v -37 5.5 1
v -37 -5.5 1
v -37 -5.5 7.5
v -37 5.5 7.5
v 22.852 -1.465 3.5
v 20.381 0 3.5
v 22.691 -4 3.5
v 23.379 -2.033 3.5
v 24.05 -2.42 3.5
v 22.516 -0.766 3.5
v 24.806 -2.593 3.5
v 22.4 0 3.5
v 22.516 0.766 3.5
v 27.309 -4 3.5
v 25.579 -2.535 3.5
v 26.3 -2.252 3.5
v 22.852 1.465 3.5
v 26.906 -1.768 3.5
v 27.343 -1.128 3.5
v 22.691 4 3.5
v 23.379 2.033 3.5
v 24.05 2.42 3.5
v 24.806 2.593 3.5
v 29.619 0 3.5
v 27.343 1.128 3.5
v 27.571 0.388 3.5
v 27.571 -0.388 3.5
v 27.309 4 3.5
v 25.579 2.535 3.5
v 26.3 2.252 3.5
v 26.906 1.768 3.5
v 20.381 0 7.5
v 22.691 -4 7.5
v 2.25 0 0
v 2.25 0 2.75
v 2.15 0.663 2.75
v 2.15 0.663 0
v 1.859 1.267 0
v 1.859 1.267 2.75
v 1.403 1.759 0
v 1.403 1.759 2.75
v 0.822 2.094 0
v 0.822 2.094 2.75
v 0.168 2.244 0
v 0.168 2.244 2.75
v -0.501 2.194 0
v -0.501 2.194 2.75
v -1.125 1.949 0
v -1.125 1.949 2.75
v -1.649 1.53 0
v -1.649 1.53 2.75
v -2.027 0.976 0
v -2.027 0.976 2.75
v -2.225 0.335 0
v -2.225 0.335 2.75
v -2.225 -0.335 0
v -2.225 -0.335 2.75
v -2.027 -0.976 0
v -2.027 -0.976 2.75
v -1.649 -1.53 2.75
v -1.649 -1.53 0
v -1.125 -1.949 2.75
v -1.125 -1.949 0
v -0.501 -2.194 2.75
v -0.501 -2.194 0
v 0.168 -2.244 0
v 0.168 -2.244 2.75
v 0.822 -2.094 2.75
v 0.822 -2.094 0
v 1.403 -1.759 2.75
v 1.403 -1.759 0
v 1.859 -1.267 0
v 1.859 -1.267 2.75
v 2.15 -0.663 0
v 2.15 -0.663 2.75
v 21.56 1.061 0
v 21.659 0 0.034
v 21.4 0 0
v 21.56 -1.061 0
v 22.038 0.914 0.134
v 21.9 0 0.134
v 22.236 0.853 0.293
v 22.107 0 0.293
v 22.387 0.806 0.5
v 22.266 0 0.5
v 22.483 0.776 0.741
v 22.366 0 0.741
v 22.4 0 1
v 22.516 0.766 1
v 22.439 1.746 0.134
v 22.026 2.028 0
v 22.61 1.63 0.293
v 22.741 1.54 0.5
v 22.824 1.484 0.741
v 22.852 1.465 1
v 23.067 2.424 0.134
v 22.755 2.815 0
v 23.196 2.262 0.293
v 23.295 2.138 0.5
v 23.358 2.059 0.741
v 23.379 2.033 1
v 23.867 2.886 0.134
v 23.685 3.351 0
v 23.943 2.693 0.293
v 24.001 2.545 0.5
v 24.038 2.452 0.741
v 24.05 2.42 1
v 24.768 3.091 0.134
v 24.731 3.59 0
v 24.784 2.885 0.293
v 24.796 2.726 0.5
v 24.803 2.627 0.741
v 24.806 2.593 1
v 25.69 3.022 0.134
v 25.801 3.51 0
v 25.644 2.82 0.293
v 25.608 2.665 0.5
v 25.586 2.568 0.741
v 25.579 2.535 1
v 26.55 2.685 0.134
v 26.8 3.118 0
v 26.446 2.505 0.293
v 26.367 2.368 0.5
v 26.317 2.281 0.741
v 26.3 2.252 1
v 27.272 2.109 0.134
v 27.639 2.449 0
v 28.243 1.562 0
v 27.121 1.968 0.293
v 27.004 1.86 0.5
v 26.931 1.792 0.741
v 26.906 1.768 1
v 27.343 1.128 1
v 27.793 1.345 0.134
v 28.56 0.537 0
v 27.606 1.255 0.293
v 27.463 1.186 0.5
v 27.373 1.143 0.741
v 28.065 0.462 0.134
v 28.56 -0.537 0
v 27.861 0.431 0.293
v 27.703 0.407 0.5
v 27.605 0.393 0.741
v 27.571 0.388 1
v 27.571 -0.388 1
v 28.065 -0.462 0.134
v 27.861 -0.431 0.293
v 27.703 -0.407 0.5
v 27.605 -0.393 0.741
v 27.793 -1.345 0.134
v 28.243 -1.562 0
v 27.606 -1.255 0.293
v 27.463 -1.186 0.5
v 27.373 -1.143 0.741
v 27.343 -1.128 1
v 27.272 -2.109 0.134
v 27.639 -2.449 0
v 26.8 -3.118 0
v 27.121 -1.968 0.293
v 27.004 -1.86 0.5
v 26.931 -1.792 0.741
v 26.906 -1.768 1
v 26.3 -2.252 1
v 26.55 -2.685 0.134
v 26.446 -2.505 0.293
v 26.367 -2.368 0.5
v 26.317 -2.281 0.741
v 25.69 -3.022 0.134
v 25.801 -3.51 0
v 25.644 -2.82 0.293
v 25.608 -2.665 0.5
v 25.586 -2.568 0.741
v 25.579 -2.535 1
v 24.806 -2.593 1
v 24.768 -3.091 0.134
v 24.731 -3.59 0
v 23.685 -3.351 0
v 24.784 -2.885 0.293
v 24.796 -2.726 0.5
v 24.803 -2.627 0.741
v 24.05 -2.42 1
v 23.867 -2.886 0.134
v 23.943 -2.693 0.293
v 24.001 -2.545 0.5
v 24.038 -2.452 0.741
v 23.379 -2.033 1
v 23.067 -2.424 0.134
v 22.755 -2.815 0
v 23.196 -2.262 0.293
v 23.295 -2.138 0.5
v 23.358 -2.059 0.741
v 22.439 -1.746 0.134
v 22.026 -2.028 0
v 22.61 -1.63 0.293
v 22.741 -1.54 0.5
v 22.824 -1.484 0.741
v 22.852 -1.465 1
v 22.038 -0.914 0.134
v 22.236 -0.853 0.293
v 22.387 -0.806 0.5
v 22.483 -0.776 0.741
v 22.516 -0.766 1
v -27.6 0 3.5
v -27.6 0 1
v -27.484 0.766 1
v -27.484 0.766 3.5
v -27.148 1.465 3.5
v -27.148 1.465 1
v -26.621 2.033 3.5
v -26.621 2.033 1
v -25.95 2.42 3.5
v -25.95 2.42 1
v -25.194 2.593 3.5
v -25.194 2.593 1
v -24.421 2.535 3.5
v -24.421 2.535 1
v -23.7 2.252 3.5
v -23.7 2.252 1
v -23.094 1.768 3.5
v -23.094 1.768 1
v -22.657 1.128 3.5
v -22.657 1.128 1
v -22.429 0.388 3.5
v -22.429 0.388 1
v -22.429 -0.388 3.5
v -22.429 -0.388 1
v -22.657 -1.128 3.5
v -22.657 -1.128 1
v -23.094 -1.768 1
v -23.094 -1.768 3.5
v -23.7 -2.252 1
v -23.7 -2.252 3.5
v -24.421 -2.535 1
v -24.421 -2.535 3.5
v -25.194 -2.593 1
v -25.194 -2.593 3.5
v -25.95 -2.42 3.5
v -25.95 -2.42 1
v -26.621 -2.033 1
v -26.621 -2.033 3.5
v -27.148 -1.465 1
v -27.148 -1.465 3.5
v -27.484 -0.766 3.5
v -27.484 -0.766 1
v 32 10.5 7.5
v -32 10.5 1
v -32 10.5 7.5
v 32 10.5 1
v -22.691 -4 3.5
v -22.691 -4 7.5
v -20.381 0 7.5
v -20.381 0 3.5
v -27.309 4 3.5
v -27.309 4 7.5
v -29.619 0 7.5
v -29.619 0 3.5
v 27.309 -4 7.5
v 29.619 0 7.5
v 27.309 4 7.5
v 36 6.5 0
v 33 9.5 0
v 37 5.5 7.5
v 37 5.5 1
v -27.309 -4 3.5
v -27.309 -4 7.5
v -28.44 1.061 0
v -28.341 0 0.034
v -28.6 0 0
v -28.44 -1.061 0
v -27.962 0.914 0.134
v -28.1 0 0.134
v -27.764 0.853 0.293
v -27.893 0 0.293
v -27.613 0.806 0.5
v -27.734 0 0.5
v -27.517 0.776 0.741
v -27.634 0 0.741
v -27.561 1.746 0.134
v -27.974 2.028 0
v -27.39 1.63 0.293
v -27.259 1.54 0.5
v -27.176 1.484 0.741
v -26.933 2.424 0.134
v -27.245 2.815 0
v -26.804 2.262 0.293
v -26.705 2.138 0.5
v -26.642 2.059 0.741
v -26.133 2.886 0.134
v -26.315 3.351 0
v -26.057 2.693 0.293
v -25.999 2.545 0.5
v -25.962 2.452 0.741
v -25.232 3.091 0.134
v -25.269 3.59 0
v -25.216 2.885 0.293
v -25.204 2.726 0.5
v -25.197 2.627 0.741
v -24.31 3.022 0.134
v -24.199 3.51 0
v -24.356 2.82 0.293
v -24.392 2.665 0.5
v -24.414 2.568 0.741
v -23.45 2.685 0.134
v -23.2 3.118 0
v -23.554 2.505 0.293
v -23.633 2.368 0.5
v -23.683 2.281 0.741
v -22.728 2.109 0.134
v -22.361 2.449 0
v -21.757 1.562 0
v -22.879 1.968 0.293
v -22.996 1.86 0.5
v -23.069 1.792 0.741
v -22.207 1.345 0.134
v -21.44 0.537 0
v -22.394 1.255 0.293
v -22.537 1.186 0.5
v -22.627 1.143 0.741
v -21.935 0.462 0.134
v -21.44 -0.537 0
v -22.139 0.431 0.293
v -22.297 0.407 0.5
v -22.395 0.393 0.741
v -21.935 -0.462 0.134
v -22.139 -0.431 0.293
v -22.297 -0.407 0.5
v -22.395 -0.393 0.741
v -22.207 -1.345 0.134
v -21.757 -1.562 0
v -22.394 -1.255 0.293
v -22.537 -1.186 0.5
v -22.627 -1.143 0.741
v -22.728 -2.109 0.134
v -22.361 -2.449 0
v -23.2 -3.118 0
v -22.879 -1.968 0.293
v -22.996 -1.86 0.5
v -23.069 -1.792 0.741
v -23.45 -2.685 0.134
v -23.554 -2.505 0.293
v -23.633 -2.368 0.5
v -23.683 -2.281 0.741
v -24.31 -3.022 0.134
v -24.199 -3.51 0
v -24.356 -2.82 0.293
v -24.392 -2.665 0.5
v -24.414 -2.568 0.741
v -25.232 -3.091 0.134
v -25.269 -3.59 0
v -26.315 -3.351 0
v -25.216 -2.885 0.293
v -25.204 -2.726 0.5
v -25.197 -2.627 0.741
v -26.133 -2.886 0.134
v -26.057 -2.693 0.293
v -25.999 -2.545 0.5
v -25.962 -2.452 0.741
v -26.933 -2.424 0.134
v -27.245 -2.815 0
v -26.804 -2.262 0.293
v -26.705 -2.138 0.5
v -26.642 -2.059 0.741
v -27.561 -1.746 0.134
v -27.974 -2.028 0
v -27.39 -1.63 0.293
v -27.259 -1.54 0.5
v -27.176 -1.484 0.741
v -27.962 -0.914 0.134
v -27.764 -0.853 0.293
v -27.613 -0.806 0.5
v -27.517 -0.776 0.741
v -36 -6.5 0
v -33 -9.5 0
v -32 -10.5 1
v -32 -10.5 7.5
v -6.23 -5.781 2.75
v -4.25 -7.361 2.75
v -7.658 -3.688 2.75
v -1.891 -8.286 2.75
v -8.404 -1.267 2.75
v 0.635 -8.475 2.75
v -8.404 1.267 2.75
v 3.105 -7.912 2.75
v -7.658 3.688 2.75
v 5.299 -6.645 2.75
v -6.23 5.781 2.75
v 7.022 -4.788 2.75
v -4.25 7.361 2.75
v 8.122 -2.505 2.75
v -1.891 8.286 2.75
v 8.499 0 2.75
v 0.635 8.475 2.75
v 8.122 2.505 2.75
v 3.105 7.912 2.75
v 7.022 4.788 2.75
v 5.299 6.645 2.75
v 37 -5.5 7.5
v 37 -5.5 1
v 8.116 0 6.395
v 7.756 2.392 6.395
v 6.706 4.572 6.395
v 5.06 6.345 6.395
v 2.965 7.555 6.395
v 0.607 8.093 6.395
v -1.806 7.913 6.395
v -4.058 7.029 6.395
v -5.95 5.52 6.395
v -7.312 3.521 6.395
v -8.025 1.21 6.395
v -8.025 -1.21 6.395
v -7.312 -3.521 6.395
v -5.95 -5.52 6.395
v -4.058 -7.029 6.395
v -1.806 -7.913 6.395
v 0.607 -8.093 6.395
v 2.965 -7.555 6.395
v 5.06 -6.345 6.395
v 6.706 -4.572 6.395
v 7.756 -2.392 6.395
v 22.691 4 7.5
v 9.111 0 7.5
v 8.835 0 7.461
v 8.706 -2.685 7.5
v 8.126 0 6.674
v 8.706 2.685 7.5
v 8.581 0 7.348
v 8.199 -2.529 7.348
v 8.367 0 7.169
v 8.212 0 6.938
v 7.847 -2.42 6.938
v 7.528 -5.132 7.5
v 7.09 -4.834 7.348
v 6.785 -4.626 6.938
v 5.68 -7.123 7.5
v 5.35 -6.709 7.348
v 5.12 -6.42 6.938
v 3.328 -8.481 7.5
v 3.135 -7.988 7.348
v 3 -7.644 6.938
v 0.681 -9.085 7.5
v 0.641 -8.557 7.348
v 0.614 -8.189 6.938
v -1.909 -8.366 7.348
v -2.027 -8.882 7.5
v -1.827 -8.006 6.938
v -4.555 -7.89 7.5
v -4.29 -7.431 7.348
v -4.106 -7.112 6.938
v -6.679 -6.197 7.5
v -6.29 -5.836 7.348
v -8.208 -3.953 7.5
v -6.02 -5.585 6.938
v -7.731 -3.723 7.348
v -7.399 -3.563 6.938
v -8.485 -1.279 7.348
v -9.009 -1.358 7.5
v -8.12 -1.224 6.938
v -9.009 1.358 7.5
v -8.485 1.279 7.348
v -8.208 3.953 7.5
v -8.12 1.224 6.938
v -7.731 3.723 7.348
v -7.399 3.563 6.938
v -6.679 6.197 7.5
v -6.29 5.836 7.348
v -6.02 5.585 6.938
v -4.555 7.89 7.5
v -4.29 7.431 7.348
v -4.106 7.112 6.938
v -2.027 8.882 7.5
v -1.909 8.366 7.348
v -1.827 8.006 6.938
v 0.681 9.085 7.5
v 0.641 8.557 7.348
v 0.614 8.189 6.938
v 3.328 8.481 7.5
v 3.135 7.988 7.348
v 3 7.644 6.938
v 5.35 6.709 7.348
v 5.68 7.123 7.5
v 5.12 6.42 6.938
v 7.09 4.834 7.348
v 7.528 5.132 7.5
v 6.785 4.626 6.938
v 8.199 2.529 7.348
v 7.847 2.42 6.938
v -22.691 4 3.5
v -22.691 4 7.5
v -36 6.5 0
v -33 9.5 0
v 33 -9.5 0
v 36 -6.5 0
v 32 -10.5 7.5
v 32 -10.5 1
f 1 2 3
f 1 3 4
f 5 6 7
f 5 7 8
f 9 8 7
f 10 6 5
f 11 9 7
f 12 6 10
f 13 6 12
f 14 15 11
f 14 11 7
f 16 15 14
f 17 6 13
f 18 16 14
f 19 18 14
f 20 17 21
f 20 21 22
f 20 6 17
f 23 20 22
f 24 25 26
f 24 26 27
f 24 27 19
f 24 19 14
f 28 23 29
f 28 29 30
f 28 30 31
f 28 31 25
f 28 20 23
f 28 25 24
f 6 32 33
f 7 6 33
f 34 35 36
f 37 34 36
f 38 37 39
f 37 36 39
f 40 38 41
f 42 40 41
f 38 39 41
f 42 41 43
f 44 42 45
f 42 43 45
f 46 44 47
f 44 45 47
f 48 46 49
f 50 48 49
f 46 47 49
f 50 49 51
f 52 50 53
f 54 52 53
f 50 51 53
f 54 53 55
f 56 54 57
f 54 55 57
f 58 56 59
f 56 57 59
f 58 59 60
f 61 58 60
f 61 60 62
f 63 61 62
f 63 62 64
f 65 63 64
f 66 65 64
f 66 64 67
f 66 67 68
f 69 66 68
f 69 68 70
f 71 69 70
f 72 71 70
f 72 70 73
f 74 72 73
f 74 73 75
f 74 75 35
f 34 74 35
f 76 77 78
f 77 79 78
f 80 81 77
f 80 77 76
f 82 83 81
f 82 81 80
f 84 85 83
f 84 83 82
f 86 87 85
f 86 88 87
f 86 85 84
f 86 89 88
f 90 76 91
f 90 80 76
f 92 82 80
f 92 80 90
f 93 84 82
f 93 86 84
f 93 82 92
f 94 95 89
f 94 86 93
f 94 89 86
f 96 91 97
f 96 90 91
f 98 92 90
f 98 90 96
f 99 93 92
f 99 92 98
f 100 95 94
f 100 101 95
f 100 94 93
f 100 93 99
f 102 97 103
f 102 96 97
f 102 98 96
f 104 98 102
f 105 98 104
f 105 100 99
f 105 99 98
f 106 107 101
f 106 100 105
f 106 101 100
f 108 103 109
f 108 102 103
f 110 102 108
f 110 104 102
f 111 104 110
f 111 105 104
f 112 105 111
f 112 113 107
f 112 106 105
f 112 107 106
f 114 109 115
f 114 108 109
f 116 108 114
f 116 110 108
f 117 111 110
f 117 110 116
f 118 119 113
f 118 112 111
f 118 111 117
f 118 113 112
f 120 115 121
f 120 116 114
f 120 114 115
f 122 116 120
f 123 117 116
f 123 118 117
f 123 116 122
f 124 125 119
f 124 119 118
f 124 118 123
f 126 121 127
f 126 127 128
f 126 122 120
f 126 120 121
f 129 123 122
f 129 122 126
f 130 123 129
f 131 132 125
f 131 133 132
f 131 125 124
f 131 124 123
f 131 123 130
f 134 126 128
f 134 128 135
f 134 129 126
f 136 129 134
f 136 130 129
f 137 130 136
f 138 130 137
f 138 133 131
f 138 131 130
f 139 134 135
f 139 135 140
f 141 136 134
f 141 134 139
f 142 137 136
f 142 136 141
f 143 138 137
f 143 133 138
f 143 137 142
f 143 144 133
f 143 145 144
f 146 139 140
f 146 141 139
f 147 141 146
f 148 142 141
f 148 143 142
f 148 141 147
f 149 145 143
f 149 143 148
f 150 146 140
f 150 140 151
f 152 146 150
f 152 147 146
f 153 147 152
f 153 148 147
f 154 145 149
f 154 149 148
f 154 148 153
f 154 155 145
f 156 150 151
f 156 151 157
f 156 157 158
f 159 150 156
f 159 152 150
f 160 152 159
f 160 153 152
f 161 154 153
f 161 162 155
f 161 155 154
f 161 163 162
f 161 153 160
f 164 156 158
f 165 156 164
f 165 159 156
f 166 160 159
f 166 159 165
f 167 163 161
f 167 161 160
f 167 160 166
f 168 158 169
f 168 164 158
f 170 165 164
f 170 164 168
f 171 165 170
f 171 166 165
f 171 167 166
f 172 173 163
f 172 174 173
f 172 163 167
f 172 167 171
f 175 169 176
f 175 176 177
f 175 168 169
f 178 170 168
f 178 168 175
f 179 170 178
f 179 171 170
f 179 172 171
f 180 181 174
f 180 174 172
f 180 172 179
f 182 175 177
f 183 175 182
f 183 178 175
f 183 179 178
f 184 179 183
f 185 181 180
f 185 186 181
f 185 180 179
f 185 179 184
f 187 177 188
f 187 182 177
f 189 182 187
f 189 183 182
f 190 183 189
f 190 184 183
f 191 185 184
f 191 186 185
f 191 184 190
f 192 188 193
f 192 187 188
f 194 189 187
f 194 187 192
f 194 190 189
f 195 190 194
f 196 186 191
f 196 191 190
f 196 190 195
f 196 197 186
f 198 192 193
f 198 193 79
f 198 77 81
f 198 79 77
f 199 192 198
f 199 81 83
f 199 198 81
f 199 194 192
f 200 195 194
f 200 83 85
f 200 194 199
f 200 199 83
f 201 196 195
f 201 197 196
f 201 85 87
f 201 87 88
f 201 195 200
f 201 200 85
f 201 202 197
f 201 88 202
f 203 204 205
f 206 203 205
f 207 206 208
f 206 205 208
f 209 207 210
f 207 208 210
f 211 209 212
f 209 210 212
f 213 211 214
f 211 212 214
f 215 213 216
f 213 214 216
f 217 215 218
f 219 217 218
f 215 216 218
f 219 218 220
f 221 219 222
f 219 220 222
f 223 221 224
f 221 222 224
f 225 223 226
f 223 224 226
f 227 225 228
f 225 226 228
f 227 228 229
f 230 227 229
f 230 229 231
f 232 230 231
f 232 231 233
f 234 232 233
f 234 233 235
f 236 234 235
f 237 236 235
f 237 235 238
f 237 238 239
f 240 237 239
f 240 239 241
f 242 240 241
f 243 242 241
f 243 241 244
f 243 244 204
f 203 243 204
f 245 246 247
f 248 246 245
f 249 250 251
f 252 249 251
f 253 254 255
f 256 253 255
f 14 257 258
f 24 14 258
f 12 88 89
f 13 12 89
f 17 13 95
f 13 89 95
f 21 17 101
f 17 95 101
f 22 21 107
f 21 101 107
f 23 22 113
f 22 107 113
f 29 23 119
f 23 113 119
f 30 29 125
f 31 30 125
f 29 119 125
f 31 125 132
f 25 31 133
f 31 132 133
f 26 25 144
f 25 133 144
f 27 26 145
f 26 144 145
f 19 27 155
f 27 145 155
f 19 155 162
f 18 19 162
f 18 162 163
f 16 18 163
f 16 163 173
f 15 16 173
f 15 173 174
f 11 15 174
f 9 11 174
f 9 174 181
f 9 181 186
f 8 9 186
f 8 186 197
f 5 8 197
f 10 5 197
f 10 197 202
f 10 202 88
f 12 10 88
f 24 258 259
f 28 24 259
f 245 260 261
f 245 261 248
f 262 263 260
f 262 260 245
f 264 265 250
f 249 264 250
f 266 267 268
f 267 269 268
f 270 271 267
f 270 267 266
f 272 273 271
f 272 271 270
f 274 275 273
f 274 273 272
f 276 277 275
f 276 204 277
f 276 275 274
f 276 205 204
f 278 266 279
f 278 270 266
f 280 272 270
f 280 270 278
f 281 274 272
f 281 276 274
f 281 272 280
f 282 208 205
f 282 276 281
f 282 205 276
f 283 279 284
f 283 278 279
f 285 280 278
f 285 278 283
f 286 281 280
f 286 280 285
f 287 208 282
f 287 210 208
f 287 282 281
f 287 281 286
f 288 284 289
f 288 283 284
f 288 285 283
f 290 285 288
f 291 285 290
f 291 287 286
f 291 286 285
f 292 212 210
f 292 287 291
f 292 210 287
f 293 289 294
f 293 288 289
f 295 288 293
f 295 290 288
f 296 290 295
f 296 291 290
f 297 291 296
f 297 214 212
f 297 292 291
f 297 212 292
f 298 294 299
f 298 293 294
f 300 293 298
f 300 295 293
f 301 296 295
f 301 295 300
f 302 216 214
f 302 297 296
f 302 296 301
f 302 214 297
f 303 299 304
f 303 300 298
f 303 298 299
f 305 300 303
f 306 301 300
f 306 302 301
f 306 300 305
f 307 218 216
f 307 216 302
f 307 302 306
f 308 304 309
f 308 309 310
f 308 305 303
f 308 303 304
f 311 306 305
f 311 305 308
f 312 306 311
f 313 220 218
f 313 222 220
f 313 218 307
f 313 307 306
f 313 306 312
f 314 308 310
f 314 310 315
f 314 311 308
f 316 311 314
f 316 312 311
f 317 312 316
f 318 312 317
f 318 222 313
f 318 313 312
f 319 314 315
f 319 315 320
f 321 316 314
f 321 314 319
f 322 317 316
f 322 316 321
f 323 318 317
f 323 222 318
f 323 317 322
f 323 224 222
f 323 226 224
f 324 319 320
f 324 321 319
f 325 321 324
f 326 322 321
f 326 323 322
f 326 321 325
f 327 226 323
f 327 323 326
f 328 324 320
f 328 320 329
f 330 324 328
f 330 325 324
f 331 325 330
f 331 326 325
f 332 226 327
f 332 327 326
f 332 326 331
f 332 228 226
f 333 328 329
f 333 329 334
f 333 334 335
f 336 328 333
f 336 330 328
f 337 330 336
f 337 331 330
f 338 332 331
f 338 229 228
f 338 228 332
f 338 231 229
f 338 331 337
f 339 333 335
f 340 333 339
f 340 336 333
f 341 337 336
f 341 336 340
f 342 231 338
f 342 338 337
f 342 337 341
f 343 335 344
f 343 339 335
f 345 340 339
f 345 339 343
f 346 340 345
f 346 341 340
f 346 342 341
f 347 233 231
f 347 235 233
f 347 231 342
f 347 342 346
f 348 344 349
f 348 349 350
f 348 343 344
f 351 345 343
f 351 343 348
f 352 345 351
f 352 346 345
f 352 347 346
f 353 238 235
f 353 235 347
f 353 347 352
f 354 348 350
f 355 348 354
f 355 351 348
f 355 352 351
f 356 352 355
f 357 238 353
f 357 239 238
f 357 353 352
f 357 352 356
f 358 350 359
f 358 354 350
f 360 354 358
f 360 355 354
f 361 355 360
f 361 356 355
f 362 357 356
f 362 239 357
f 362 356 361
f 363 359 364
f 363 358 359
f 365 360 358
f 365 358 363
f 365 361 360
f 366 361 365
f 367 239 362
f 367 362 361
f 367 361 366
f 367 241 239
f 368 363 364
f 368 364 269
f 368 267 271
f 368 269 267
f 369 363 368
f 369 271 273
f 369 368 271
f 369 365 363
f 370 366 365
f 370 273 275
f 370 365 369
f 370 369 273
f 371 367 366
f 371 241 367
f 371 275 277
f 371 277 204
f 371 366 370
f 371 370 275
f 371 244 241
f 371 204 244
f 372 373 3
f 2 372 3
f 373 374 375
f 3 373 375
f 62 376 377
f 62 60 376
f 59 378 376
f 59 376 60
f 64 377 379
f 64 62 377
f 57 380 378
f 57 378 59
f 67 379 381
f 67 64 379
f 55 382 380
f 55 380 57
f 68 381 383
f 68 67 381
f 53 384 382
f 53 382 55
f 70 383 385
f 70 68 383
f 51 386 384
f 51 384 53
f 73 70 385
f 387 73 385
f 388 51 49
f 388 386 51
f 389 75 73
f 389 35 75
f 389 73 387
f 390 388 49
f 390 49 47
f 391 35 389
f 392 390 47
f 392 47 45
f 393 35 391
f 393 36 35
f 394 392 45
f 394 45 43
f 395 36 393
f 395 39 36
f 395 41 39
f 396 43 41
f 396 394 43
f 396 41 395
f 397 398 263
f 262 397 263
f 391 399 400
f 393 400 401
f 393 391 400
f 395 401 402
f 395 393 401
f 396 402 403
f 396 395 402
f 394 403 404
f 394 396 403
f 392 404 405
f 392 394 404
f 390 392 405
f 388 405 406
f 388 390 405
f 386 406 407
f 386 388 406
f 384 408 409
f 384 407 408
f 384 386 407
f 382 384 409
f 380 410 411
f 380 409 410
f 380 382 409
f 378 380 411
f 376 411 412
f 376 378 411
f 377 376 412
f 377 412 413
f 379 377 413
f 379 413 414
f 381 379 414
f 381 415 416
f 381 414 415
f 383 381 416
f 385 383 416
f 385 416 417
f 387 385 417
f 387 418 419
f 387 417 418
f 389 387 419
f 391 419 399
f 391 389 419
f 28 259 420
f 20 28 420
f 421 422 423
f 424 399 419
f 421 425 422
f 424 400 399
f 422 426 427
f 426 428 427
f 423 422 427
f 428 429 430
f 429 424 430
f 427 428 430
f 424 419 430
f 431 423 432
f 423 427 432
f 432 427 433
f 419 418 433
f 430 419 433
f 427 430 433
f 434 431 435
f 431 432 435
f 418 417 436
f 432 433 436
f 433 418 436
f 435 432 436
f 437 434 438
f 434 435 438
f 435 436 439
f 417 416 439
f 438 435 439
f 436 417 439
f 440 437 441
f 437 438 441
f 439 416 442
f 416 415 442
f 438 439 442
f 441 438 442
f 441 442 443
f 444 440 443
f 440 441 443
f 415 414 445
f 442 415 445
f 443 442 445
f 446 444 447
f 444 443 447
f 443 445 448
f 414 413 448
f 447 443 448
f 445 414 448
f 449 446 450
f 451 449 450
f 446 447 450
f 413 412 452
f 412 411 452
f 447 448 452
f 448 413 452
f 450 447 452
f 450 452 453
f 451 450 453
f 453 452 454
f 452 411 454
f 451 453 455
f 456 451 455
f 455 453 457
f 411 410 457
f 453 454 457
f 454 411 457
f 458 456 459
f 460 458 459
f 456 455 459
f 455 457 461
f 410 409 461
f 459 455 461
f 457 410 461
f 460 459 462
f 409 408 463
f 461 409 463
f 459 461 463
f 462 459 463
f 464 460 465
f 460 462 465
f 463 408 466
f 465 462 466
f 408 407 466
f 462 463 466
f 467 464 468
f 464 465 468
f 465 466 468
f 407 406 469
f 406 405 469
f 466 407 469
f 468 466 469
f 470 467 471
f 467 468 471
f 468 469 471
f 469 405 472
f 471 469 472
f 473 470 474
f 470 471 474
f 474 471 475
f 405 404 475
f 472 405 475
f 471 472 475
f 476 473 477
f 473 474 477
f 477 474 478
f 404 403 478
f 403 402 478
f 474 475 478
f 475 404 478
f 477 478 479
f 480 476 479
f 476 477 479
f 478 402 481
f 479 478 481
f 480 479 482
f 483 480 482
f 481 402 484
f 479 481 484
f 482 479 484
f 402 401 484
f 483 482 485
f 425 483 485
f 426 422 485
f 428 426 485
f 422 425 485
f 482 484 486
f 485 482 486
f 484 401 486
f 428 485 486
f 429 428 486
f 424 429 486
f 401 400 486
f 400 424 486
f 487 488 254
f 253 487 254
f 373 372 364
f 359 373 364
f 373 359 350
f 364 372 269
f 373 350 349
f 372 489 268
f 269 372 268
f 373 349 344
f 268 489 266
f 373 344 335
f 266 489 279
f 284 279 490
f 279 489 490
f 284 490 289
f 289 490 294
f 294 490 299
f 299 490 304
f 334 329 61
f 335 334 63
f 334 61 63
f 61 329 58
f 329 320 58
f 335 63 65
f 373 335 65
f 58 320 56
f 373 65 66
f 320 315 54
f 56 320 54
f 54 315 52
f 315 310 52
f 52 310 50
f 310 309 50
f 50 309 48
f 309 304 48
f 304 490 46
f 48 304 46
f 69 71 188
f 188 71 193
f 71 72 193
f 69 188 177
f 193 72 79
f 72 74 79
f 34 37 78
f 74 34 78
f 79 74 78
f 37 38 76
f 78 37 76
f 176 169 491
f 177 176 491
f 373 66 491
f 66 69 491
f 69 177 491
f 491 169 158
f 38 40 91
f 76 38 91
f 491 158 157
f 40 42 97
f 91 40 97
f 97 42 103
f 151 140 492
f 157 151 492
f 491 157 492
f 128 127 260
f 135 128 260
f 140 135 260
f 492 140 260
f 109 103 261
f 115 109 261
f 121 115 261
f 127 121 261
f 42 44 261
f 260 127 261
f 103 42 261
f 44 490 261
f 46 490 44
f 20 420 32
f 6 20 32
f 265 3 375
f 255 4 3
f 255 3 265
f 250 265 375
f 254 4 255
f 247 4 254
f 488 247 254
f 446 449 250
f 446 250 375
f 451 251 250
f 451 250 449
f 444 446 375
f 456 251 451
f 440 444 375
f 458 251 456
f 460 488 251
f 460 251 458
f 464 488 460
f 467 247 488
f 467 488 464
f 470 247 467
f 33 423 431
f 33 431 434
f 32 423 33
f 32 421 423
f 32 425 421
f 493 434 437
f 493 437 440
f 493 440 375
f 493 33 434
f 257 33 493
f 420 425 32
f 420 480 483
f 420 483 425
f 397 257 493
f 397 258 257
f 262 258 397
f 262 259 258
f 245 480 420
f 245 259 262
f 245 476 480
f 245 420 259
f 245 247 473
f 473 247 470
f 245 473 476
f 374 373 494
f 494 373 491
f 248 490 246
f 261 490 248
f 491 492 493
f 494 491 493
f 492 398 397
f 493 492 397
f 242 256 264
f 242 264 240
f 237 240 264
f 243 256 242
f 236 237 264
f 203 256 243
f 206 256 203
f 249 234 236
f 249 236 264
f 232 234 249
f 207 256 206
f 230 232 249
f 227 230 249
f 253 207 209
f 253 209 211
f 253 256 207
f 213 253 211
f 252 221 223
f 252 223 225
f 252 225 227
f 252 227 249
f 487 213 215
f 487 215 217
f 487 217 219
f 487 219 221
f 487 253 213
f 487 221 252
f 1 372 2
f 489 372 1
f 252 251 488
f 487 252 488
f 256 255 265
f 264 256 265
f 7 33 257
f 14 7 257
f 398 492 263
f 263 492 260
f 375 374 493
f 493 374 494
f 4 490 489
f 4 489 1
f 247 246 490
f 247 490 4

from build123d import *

# Parameters (mm, degrees)
SKETCH1_W           = 74
SKETCH1_H           = 21
BOSS_EXTRUDE1_DEPTH = 7.5
SKETCH2_R           = 8
CUT_EXTRUDE1_DEPTH  = 4.75
CUT_EXTRUDE1_TAPER  = -6
SKETCH4_R           = 2.6
CUT_EXTRUDE4_DEPTH  = 8.5000001
CHAMFER3_SIZE       = 5
CUT_EXTRUDE6_DEPTH  = 4
SKETCH11_R          = 2.25
CUT_EXTRUDE10_DEPTH = 8.5
FILLET4_R           = 1
FILLET5_R           = 1
CHAMFER5_SIZE       = 1


with BuildPart() as part:
    # Sketch1 → Boss-Extrude1 (new body)
    with BuildSketch(Plane.XY):
        Rectangle(SKETCH1_W, SKETCH1_H)
    extrude(amount=BOSS_EXTRUDE1_DEPTH)

    # Sketch2 → Cut-Extrude1 (cut)
    with BuildSketch(Plane.XY.offset(7.5)):
        Circle(SKETCH2_R)
    extrude(amount=-CUT_EXTRUDE1_DEPTH, taper=CUT_EXTRUDE1_TAPER, mode=Mode.SUBTRACT)

    # Sketch4 → Cut-Extrude4 (cut, through all)
    with BuildSketch(Plane(origin=(0, 0, 0), x_dir=(-1, 0, 0), z_dir=(0, 0, -1))):
        with Locations((-25, 0)):
            Circle(SKETCH4_R)
        with Locations((25, 0)):
            Circle(SKETCH4_R)
    extrude(amount=-CUT_EXTRUDE4_DEPTH, mode=Mode.SUBTRACT)

    # Chamfer3
    chamfer3_edges = [part.edges().sort_by_distance(p)[0] for p in [
        (37, -10.5, 3.75),
        (-37, -10.5, 3.75),
        (-37, 10.5, 3.75),
        (37, 10.5, 3.75),
    ]]
    chamfer(chamfer3_edges, length=CHAMFER3_SIZE)

    # Sketch5 → Cut-Extrude6 (cut)
    with BuildSketch(Plane.XY.offset(7.5)):
        Polygon((22.690598923, -4), (27.309401077, -4), (29.618802154, 0), (27.309401077, 4), (22.690598923, 4), (20.381197846, 0), align=None)
        Polygon((-27.309401077, -4), (-22.690598923, -4), (-20.381197846, 0), (-22.690598923, 4), (-27.309401077, 4), (-29.618802154, 0), align=None)
    extrude(amount=-CUT_EXTRUDE6_DEPTH, mode=Mode.SUBTRACT)

    # Sketch11 → Cut-Extrude10 (cut, through all)
    with BuildSketch(Plane.XY.offset(7.5)):
        Circle(SKETCH11_R)
    extrude(amount=-CUT_EXTRUDE10_DEPTH, mode=Mode.SUBTRACT)

    # Fillet4
    fillet4_edges = [part.edges().sort_by_distance(p)[0] for p in [
        (27.6, 0, 0),
        (-22.4, 0, 0),
    ]]
    fillet(fillet4_edges, radius=FILLET4_R)

    # Fillet5
    fillet5_edges = [part.edges().sort_by_distance(p)[0] for p in [
        (-8, 0, 7.5),
    ]]
    fillet(fillet5_edges, radius=FILLET5_R)

    # Chamfer5
    chamfer5_edges = [part.edges().sort_by_distance(p)[0] for p in [
        (-37, 0, 0),
        (37, 0, 0),
        (0, -10.5, 0),
        (0, 10.5, 0),
    ]]
    chamfer(chamfer5_edges, length=CHAMFER5_SIZE)


solid = part.part
